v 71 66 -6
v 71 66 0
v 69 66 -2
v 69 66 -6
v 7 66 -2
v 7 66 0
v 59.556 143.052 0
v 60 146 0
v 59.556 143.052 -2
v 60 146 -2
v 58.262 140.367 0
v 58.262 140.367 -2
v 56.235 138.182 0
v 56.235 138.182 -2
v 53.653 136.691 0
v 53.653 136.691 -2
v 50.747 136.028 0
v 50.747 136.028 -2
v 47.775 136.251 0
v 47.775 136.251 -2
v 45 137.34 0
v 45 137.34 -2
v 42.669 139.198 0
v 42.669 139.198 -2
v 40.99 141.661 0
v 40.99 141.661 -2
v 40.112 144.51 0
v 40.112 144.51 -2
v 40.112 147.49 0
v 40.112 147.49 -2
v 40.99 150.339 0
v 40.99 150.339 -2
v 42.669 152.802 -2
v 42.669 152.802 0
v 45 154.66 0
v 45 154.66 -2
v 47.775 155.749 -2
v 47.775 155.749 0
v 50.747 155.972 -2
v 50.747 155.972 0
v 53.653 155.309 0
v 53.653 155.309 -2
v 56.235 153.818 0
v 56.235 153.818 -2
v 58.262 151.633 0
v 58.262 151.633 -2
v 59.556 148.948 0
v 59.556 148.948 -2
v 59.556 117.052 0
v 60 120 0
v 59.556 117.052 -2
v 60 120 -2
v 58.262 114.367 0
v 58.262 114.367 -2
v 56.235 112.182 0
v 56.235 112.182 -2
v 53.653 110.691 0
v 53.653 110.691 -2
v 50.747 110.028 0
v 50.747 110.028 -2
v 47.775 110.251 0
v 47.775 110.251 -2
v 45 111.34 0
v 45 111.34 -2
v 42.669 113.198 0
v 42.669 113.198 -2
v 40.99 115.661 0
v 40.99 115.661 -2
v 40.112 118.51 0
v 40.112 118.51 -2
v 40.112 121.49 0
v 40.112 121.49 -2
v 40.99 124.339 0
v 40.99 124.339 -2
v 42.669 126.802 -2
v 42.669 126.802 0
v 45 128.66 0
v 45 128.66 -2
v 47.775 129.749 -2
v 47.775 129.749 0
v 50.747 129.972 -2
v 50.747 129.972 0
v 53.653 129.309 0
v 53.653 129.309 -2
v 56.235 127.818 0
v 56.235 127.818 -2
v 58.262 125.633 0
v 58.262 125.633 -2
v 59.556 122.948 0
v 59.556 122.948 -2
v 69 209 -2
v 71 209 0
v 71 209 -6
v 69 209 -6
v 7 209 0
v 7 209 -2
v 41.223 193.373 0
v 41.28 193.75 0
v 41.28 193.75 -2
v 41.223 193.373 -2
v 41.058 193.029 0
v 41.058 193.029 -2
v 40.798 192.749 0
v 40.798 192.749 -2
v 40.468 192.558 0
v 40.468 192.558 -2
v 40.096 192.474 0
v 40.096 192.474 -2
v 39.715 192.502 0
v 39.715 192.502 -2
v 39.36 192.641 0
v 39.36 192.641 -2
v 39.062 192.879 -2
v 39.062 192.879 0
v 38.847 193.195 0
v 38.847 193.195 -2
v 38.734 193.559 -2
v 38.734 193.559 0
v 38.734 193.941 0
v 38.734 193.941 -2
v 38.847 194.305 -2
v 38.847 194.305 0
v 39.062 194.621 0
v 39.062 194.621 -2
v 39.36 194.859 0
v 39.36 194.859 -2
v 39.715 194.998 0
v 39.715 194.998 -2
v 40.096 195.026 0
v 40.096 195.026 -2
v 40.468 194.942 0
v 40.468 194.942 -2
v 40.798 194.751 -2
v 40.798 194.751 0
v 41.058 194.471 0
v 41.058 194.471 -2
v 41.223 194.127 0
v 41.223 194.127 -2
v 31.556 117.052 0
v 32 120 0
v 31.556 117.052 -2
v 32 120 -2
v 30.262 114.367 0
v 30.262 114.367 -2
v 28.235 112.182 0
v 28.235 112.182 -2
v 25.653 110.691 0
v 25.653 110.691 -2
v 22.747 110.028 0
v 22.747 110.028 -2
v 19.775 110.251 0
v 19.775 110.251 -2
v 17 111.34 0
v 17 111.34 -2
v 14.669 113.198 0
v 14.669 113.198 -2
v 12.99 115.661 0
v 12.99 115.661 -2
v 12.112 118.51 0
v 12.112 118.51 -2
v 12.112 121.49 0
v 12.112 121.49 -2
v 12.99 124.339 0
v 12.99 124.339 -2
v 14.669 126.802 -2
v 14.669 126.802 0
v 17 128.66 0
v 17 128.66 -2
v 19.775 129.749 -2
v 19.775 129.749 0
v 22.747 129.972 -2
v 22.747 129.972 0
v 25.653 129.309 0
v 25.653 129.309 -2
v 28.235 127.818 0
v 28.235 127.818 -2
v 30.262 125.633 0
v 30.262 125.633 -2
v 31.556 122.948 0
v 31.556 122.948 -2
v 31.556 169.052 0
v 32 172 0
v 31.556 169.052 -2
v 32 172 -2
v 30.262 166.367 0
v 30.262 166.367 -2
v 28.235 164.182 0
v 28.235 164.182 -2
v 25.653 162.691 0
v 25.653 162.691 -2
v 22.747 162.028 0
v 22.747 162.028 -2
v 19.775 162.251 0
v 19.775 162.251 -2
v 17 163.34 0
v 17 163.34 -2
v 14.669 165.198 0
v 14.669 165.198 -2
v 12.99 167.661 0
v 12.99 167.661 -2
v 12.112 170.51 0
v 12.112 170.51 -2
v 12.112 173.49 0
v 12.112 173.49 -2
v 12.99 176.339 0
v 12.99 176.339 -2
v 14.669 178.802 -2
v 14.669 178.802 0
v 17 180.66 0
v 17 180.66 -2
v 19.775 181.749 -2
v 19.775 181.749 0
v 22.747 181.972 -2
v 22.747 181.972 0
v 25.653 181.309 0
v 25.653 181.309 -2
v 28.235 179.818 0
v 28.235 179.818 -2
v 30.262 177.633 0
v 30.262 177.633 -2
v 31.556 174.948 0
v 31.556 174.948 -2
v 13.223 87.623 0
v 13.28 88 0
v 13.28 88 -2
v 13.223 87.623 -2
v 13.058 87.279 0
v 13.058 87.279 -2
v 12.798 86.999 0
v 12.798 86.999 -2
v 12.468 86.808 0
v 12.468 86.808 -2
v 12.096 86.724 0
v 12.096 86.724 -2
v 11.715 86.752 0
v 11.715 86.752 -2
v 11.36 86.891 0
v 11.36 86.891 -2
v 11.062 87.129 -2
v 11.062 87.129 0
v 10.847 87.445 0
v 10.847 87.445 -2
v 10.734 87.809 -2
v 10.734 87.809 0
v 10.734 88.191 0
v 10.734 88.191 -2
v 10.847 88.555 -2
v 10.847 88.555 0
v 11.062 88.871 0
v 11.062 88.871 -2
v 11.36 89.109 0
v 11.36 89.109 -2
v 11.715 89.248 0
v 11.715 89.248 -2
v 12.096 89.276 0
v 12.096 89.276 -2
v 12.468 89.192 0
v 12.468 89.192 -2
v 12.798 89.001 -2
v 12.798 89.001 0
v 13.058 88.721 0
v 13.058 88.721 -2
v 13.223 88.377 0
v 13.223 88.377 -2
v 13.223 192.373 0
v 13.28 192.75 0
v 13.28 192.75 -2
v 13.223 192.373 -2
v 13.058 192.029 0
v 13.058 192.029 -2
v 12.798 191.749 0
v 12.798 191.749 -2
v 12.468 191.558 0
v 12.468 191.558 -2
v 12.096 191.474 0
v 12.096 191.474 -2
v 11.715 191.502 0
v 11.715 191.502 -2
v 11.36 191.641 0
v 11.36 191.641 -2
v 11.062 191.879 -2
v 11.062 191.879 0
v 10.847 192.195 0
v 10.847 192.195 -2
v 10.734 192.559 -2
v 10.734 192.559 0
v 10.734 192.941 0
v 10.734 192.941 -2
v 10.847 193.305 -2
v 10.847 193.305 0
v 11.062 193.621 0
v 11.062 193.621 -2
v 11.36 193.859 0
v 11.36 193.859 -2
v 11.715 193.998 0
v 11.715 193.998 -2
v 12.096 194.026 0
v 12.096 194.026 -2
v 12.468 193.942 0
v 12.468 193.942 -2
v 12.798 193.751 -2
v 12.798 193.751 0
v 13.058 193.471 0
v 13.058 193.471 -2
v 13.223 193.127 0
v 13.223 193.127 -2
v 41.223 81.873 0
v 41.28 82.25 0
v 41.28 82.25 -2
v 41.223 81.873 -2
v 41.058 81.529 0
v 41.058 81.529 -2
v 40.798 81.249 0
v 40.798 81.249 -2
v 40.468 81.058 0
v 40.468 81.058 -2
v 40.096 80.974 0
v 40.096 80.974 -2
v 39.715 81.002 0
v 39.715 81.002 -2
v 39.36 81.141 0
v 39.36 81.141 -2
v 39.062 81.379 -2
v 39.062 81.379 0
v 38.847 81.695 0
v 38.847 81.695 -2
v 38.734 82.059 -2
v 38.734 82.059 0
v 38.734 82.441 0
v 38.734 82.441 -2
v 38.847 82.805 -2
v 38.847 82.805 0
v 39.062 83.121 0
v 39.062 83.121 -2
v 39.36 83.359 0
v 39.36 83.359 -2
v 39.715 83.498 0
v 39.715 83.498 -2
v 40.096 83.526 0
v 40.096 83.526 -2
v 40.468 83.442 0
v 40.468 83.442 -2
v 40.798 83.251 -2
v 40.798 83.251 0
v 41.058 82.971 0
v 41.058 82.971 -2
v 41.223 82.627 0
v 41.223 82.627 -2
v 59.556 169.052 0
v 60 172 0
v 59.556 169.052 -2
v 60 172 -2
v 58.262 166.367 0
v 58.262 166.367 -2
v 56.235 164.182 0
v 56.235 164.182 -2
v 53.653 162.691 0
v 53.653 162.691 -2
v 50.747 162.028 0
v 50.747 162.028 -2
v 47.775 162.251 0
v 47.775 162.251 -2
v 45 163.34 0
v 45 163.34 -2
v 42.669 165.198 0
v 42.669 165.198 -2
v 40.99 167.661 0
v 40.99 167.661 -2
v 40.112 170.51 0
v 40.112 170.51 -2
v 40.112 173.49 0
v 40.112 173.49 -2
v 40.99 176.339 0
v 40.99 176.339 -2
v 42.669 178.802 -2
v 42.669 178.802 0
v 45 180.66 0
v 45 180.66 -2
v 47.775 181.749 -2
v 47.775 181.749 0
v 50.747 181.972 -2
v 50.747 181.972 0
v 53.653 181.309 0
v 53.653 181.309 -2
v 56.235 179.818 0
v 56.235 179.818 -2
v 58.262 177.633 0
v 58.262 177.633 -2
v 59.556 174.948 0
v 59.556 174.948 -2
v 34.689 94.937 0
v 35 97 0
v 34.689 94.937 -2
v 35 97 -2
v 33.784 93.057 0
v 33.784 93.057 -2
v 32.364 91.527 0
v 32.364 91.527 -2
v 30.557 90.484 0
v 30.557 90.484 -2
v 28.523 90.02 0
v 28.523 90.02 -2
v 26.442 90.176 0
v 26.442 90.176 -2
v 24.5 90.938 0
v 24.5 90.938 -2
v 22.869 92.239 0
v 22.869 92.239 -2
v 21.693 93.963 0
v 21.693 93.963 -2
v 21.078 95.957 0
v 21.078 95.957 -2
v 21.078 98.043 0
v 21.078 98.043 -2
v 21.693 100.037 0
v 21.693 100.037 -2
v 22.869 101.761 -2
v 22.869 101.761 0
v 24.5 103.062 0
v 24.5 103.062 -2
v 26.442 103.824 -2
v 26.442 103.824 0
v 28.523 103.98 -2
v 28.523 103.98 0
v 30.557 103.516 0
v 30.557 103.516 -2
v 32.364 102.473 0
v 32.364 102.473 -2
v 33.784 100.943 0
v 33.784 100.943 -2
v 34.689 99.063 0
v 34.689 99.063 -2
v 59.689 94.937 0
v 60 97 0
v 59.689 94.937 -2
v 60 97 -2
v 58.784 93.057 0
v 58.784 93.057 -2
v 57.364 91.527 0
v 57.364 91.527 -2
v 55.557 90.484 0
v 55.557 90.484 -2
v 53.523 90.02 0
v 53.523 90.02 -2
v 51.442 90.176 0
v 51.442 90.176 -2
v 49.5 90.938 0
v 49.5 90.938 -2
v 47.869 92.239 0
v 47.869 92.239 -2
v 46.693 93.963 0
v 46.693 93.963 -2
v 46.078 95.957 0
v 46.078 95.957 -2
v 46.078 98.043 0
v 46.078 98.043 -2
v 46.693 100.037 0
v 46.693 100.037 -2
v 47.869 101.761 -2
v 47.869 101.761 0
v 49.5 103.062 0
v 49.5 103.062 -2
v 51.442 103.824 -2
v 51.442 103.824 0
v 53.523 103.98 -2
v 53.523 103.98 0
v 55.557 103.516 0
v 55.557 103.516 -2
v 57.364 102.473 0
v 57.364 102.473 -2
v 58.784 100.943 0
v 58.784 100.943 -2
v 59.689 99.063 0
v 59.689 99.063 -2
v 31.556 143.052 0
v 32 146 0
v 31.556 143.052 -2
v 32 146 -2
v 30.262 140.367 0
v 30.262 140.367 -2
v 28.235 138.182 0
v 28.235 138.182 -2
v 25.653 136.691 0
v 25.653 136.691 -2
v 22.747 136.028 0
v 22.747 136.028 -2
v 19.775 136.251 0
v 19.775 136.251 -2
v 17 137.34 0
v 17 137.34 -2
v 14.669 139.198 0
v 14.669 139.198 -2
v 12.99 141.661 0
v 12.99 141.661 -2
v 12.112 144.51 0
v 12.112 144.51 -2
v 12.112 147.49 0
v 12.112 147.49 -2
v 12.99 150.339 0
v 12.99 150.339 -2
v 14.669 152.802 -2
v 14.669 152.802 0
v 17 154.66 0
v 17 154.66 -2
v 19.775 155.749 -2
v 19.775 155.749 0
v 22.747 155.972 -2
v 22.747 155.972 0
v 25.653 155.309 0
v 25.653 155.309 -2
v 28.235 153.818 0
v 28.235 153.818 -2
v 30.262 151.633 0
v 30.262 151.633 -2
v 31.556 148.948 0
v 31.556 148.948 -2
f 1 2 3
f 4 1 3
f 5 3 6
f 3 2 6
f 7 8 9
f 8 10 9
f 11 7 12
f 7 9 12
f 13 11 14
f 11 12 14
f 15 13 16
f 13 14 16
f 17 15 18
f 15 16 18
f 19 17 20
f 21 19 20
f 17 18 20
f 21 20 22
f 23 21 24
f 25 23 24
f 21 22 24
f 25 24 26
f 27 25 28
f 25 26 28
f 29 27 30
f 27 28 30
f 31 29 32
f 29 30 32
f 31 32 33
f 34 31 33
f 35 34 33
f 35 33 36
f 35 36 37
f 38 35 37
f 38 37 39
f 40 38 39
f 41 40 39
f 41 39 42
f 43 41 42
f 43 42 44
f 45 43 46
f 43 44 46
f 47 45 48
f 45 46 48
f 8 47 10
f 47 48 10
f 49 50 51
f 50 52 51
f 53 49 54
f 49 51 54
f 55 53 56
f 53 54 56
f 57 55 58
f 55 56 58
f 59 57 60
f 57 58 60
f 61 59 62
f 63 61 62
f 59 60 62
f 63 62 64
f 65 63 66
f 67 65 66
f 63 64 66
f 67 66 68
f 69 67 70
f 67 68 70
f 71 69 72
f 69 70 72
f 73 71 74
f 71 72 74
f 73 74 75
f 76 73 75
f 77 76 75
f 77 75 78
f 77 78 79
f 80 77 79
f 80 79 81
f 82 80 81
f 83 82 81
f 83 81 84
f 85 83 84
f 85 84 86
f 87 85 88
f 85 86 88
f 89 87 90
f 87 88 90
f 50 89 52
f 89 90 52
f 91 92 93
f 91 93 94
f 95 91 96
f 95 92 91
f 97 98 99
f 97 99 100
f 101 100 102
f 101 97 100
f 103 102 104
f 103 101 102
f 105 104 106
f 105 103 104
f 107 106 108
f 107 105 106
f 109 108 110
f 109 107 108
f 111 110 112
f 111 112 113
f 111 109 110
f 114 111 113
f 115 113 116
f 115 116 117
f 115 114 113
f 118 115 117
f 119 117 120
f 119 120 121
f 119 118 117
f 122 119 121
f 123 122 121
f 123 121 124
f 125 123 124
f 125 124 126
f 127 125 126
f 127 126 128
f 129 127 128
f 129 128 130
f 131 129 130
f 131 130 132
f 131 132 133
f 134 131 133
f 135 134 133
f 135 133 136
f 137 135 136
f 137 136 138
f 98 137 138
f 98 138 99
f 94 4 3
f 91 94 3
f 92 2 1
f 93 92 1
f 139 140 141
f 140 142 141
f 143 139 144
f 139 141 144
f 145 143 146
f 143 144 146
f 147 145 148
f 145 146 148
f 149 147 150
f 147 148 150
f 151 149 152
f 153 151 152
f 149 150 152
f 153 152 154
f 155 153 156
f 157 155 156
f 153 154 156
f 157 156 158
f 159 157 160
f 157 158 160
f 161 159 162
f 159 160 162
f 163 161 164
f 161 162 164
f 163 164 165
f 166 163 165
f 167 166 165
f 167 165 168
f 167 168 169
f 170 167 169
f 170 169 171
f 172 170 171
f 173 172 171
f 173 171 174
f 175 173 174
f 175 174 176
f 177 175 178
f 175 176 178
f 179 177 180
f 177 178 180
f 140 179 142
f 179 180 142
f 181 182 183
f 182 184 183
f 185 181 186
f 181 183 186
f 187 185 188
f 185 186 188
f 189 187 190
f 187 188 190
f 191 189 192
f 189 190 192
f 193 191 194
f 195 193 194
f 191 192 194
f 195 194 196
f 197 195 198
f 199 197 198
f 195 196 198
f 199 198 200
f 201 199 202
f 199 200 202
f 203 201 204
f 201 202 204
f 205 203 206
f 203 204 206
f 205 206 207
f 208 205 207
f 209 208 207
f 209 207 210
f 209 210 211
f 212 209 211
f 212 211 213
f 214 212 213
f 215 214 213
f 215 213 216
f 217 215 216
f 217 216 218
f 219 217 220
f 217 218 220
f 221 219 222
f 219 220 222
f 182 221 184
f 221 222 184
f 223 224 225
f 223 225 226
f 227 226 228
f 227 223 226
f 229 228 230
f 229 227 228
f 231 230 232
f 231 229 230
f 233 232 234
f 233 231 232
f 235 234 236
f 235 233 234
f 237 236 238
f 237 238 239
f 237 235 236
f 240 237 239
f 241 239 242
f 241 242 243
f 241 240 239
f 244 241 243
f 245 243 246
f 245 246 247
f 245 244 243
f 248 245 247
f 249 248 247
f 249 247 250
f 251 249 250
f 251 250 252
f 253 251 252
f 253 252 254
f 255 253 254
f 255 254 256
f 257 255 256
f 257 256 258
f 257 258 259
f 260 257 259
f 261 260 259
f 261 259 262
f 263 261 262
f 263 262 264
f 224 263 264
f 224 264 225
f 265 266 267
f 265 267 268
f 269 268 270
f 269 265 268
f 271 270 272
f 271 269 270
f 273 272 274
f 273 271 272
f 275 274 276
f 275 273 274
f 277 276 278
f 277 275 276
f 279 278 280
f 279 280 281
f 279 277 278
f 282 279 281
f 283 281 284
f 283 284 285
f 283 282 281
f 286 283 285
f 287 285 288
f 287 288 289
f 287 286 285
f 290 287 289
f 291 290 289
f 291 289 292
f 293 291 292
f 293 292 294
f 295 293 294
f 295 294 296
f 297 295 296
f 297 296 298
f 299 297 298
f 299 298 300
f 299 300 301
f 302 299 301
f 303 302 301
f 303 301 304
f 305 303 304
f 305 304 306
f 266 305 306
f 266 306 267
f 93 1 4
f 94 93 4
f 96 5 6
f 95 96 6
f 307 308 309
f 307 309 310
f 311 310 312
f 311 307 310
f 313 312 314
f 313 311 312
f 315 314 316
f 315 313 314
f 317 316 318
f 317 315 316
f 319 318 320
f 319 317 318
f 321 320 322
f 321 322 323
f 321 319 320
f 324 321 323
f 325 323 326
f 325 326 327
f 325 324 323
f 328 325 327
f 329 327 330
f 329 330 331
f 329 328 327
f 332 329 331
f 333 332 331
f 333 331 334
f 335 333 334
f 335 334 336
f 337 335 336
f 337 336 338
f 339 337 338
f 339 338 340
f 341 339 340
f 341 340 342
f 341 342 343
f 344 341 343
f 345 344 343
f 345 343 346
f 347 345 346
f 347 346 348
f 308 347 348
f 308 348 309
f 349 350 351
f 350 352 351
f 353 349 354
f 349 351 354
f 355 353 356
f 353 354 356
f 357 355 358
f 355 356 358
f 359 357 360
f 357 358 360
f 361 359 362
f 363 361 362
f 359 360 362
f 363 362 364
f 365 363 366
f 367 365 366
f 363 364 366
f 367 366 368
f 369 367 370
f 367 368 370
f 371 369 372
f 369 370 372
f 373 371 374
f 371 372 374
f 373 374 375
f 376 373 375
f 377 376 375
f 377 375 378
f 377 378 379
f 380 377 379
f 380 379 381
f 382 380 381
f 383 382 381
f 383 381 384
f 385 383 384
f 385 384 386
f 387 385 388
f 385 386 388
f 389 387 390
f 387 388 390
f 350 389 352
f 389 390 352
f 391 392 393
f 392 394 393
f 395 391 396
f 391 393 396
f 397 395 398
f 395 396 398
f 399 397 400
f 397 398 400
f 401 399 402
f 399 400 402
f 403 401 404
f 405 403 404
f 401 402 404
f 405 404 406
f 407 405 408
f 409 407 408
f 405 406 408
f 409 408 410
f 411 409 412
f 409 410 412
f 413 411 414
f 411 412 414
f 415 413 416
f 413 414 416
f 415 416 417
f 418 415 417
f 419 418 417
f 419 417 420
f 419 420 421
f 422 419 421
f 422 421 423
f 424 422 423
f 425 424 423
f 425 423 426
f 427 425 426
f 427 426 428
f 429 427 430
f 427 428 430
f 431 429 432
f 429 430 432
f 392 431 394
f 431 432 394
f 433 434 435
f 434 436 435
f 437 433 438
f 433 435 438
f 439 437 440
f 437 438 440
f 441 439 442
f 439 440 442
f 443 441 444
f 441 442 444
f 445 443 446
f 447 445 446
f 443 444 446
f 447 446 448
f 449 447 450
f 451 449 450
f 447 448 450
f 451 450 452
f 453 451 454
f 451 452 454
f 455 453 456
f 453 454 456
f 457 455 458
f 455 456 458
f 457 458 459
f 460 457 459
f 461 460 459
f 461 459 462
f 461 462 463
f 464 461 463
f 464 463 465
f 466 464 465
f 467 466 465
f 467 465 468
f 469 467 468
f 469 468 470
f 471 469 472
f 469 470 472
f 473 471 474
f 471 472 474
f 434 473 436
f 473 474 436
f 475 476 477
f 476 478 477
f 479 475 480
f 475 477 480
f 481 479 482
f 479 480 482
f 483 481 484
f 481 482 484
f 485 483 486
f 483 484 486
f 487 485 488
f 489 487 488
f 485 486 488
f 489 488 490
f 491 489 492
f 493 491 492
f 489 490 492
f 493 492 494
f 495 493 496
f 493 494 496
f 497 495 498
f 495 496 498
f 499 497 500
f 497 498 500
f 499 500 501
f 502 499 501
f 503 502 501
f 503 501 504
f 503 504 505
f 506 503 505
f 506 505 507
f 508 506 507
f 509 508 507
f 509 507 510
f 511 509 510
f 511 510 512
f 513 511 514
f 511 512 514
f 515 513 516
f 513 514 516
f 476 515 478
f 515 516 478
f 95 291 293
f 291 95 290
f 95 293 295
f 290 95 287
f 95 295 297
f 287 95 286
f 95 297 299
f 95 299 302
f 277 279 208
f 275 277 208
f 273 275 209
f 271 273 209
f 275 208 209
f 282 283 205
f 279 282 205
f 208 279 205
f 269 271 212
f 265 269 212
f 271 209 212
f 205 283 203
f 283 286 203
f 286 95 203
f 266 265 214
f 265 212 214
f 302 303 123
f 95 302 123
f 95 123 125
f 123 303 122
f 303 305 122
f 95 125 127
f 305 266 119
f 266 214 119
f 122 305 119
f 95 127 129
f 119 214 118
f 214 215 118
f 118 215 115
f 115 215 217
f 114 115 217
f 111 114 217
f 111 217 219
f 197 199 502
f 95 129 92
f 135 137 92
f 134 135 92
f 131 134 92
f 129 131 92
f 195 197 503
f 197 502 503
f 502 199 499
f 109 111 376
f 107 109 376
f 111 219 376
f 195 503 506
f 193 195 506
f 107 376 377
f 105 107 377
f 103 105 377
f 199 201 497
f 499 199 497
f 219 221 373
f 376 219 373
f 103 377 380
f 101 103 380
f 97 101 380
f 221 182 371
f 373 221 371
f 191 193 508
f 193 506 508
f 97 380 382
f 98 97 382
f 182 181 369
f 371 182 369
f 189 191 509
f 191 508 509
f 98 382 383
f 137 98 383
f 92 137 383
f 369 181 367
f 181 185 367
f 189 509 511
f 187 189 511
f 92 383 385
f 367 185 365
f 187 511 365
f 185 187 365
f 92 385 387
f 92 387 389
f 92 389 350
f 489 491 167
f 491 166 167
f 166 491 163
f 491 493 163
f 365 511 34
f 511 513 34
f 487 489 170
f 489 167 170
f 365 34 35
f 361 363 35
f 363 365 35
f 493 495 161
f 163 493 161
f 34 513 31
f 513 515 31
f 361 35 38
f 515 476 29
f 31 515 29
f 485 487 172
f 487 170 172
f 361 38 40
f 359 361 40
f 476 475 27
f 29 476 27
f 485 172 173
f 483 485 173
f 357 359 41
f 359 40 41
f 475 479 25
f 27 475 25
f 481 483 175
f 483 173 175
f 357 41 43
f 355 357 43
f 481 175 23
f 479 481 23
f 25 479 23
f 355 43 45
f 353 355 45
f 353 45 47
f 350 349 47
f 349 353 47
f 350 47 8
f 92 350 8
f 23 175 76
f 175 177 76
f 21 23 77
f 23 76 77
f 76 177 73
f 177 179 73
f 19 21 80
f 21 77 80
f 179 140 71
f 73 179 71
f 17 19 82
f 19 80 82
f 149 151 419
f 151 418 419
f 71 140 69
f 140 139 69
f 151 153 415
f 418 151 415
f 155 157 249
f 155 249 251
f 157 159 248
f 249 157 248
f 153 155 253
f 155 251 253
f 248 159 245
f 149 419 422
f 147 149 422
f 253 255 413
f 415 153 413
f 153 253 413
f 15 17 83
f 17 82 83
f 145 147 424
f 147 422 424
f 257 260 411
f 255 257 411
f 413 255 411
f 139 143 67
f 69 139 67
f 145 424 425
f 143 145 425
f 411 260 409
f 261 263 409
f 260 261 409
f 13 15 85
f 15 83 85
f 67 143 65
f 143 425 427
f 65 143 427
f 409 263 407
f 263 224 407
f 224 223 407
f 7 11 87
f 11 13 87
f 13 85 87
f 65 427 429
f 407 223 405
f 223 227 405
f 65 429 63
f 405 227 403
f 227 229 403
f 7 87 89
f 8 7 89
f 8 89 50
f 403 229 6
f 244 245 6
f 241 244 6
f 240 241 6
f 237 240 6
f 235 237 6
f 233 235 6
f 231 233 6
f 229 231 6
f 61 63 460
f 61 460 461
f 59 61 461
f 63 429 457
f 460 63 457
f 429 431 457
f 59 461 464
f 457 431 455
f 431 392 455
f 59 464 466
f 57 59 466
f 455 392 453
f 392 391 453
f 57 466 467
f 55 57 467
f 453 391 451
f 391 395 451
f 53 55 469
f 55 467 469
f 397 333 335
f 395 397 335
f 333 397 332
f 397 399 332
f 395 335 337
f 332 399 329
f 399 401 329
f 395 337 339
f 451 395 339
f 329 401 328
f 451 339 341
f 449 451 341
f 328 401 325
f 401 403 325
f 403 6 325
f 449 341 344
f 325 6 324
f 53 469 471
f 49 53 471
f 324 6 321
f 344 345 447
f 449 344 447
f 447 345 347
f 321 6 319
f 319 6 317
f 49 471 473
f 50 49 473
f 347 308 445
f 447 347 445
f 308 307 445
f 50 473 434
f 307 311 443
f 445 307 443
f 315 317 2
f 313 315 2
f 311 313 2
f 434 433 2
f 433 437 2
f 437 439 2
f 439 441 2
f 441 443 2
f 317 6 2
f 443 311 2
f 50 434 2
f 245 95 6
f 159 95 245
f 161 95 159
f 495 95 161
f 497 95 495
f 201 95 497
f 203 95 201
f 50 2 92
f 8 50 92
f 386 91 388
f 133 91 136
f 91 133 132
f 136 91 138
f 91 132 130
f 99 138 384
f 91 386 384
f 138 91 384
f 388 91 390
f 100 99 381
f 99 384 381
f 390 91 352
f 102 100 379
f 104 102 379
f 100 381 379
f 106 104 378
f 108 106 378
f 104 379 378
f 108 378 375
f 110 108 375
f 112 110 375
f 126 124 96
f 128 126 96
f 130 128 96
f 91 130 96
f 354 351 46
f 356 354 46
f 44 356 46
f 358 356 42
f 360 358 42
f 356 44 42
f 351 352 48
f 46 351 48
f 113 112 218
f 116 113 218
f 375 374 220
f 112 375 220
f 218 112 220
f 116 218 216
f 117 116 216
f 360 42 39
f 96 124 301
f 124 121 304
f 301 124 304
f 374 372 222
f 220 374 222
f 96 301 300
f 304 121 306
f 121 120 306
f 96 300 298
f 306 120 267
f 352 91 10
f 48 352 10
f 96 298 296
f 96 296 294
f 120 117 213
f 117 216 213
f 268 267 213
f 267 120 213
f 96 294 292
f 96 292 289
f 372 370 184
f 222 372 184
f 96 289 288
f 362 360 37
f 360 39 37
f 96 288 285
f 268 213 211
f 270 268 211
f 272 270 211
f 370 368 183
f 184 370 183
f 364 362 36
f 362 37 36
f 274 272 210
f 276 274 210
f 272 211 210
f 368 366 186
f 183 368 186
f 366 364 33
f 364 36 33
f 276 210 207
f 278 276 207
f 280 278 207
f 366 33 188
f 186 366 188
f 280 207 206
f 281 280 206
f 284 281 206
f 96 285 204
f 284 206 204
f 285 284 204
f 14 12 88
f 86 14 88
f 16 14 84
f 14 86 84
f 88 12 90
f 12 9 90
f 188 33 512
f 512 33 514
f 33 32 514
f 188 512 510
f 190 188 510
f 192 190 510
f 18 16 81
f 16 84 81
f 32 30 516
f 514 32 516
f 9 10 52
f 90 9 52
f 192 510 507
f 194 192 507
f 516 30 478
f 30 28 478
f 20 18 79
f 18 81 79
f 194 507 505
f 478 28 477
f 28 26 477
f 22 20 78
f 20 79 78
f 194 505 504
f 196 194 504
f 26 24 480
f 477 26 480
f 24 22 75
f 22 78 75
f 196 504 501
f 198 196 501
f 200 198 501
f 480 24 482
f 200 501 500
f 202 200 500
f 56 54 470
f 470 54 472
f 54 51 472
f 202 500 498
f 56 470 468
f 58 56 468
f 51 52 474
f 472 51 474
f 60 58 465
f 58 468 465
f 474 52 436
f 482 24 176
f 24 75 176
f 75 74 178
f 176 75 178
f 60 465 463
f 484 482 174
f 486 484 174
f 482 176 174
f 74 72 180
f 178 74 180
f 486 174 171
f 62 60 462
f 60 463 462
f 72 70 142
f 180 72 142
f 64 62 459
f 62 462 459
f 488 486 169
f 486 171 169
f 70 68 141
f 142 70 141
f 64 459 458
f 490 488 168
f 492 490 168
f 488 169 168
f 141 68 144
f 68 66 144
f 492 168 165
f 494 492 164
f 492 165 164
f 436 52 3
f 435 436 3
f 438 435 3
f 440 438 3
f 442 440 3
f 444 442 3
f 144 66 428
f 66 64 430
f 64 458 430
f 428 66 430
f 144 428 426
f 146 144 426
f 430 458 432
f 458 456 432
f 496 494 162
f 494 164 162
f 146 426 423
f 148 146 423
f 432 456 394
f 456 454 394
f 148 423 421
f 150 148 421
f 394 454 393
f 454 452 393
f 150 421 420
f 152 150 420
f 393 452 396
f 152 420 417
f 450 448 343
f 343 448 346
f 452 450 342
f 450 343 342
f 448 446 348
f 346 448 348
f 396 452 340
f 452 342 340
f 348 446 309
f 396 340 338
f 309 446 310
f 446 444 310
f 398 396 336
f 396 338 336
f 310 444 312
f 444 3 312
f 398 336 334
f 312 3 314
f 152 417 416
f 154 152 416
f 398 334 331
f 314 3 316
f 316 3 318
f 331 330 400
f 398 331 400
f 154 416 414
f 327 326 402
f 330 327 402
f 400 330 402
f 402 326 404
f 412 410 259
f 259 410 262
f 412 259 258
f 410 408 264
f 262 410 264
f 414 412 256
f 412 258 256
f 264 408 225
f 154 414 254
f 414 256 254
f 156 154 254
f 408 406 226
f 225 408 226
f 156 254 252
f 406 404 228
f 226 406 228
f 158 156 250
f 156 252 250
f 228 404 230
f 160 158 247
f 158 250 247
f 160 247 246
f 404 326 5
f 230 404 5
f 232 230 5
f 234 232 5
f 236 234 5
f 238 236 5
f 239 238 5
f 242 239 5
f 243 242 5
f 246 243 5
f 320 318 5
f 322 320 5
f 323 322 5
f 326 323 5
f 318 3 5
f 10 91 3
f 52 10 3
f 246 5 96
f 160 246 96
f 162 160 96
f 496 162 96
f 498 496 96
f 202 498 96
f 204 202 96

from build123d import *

# Parameters (mm, degrees)
SKETCH138_R           = 7
SKETCH138_R_2         = 10
EXTRUDE128_DEPTH      = 1
EXTRUDE128_DEPTH_BACK = 3
SKETCH117_R           = 1.28
EXTRUDE107_DEPTH      = 3
EXTRUDE104_DEPTH      = 143


with BuildPart() as extrude128:
    # Sketch138 → Extrude128 (new body, two sides)
    with BuildSketch(Plane(origin=(0, 0, -2), x_dir=(1, 0, 0), z_dir=(0, 0, -1))) as extrude128_sk:
        with Locations((28, -97)):
            Circle(SKETCH138_R)
        with Locations((53, -97)):
            Circle(SKETCH138_R)
        with Locations((22, -146)):
            Circle(SKETCH138_R_2)
        with Locations((50, -146)):
            Circle(SKETCH138_R_2)
        with Locations((22, -172)):
            Circle(SKETCH138_R_2)
        with Locations((50, -172)):
            Circle(SKETCH138_R_2)
        with Locations((22, -120)):
            Circle(SKETCH138_R_2)
        with Locations((50, -120)):
            Circle(SKETCH138_R_2)
    extrude(amount=EXTRUDE128_DEPTH)
    extrude(extrude128_sk.sketch, amount=-EXTRUDE128_DEPTH_BACK)


with BuildPart() as compound022:
    # Sketch117 → Extrude107 (new body)
    with BuildSketch(Plane(origin=(0, 0, 1), x_dir=(1, 0, 0), z_dir=(0, 0, -1))):
        with Locations((12, -88)):
            Circle(SKETCH117_R)
        with Locations((40, -82.25)):
            Circle(SKETCH117_R)
        with Locations((12, -192.75)):
            Circle(SKETCH117_R)
        with Locations((40, -193.75)):
            Circle(SKETCH117_R)
    extrude(amount=EXTRUDE107_DEPTH)

    # Compound022: union Extrude128
    add(extrude128.part)


with BuildPart() as hdmi002:
    # Sketch114 → Extrude104 (new body)
    with BuildSketch(Plane(origin=(0, 66, 0), x_dir=(-1, 0, 0), z_dir=(0, 1, 0))):
        Polygon((-7, -2), (-7, 0), (-71, 0), (-71, -6), (-69, -6), (-69, -2), align=None)
    extrude(amount=EXTRUDE104_DEPTH)

    # Cut013: cut Compound022
    add(compound022.part, mode=Mode.SUBTRACT)


solid = hdmi002.part
